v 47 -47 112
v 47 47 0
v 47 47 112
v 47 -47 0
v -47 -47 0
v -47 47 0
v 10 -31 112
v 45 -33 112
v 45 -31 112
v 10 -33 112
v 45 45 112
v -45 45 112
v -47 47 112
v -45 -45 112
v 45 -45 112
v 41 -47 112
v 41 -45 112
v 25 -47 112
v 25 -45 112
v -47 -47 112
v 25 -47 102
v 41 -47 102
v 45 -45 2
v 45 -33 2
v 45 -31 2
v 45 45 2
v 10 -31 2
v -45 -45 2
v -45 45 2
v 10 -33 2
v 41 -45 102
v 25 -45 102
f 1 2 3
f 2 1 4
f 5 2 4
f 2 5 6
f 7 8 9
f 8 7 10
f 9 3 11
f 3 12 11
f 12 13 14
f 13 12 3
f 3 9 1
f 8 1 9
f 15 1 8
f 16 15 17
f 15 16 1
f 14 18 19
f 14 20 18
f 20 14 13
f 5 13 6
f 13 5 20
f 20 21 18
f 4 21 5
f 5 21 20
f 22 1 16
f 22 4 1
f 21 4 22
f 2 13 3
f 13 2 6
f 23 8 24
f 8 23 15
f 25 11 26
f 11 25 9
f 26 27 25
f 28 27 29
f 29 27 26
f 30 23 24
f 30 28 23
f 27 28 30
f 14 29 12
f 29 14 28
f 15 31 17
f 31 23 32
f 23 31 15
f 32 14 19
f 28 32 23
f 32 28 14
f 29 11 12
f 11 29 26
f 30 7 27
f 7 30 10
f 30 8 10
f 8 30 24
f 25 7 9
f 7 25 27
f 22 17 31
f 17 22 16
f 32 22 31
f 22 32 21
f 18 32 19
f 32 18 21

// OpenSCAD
// Independent lift-off hood. Units mm; print mode is roof-down.
clear_height=110; // provisional: 88 hardware envelope + 22 relaxed-wire allowance
wall=2;
mode="print"; // print, assembly, cutaway
assert(clear_height>=88);
module hood(){
 difference(){
  union(){
   difference(){
    translate([-47,-47,0]) cube([94,94,clear_height+wall]);
    translate([-45,-45,-0.1]) cube([90,90,clear_height+0.1]);
   }
   // Full-height baffle overlaps right wall and roof; no hanging wall in print pose.
   translate([10,31,0]) cube([36,2,clear_height+1]);
  }
  translate([25,44.99,-0.1]) cube([16,3.1,10.1]);
 }
}
module assembly_hood(){translate([6,-7,0]) hood();}
if(mode=="print") translate([0,0,clear_height+wall]) rotate([180,0,0]) hood();
else {
 color([0.15,0.17,0.2])
 if(mode=="cutaway") difference(){assembly_hood();translate([-60,-65,0]) cube([120,60,130]);}
 else assembly_hood();
}
